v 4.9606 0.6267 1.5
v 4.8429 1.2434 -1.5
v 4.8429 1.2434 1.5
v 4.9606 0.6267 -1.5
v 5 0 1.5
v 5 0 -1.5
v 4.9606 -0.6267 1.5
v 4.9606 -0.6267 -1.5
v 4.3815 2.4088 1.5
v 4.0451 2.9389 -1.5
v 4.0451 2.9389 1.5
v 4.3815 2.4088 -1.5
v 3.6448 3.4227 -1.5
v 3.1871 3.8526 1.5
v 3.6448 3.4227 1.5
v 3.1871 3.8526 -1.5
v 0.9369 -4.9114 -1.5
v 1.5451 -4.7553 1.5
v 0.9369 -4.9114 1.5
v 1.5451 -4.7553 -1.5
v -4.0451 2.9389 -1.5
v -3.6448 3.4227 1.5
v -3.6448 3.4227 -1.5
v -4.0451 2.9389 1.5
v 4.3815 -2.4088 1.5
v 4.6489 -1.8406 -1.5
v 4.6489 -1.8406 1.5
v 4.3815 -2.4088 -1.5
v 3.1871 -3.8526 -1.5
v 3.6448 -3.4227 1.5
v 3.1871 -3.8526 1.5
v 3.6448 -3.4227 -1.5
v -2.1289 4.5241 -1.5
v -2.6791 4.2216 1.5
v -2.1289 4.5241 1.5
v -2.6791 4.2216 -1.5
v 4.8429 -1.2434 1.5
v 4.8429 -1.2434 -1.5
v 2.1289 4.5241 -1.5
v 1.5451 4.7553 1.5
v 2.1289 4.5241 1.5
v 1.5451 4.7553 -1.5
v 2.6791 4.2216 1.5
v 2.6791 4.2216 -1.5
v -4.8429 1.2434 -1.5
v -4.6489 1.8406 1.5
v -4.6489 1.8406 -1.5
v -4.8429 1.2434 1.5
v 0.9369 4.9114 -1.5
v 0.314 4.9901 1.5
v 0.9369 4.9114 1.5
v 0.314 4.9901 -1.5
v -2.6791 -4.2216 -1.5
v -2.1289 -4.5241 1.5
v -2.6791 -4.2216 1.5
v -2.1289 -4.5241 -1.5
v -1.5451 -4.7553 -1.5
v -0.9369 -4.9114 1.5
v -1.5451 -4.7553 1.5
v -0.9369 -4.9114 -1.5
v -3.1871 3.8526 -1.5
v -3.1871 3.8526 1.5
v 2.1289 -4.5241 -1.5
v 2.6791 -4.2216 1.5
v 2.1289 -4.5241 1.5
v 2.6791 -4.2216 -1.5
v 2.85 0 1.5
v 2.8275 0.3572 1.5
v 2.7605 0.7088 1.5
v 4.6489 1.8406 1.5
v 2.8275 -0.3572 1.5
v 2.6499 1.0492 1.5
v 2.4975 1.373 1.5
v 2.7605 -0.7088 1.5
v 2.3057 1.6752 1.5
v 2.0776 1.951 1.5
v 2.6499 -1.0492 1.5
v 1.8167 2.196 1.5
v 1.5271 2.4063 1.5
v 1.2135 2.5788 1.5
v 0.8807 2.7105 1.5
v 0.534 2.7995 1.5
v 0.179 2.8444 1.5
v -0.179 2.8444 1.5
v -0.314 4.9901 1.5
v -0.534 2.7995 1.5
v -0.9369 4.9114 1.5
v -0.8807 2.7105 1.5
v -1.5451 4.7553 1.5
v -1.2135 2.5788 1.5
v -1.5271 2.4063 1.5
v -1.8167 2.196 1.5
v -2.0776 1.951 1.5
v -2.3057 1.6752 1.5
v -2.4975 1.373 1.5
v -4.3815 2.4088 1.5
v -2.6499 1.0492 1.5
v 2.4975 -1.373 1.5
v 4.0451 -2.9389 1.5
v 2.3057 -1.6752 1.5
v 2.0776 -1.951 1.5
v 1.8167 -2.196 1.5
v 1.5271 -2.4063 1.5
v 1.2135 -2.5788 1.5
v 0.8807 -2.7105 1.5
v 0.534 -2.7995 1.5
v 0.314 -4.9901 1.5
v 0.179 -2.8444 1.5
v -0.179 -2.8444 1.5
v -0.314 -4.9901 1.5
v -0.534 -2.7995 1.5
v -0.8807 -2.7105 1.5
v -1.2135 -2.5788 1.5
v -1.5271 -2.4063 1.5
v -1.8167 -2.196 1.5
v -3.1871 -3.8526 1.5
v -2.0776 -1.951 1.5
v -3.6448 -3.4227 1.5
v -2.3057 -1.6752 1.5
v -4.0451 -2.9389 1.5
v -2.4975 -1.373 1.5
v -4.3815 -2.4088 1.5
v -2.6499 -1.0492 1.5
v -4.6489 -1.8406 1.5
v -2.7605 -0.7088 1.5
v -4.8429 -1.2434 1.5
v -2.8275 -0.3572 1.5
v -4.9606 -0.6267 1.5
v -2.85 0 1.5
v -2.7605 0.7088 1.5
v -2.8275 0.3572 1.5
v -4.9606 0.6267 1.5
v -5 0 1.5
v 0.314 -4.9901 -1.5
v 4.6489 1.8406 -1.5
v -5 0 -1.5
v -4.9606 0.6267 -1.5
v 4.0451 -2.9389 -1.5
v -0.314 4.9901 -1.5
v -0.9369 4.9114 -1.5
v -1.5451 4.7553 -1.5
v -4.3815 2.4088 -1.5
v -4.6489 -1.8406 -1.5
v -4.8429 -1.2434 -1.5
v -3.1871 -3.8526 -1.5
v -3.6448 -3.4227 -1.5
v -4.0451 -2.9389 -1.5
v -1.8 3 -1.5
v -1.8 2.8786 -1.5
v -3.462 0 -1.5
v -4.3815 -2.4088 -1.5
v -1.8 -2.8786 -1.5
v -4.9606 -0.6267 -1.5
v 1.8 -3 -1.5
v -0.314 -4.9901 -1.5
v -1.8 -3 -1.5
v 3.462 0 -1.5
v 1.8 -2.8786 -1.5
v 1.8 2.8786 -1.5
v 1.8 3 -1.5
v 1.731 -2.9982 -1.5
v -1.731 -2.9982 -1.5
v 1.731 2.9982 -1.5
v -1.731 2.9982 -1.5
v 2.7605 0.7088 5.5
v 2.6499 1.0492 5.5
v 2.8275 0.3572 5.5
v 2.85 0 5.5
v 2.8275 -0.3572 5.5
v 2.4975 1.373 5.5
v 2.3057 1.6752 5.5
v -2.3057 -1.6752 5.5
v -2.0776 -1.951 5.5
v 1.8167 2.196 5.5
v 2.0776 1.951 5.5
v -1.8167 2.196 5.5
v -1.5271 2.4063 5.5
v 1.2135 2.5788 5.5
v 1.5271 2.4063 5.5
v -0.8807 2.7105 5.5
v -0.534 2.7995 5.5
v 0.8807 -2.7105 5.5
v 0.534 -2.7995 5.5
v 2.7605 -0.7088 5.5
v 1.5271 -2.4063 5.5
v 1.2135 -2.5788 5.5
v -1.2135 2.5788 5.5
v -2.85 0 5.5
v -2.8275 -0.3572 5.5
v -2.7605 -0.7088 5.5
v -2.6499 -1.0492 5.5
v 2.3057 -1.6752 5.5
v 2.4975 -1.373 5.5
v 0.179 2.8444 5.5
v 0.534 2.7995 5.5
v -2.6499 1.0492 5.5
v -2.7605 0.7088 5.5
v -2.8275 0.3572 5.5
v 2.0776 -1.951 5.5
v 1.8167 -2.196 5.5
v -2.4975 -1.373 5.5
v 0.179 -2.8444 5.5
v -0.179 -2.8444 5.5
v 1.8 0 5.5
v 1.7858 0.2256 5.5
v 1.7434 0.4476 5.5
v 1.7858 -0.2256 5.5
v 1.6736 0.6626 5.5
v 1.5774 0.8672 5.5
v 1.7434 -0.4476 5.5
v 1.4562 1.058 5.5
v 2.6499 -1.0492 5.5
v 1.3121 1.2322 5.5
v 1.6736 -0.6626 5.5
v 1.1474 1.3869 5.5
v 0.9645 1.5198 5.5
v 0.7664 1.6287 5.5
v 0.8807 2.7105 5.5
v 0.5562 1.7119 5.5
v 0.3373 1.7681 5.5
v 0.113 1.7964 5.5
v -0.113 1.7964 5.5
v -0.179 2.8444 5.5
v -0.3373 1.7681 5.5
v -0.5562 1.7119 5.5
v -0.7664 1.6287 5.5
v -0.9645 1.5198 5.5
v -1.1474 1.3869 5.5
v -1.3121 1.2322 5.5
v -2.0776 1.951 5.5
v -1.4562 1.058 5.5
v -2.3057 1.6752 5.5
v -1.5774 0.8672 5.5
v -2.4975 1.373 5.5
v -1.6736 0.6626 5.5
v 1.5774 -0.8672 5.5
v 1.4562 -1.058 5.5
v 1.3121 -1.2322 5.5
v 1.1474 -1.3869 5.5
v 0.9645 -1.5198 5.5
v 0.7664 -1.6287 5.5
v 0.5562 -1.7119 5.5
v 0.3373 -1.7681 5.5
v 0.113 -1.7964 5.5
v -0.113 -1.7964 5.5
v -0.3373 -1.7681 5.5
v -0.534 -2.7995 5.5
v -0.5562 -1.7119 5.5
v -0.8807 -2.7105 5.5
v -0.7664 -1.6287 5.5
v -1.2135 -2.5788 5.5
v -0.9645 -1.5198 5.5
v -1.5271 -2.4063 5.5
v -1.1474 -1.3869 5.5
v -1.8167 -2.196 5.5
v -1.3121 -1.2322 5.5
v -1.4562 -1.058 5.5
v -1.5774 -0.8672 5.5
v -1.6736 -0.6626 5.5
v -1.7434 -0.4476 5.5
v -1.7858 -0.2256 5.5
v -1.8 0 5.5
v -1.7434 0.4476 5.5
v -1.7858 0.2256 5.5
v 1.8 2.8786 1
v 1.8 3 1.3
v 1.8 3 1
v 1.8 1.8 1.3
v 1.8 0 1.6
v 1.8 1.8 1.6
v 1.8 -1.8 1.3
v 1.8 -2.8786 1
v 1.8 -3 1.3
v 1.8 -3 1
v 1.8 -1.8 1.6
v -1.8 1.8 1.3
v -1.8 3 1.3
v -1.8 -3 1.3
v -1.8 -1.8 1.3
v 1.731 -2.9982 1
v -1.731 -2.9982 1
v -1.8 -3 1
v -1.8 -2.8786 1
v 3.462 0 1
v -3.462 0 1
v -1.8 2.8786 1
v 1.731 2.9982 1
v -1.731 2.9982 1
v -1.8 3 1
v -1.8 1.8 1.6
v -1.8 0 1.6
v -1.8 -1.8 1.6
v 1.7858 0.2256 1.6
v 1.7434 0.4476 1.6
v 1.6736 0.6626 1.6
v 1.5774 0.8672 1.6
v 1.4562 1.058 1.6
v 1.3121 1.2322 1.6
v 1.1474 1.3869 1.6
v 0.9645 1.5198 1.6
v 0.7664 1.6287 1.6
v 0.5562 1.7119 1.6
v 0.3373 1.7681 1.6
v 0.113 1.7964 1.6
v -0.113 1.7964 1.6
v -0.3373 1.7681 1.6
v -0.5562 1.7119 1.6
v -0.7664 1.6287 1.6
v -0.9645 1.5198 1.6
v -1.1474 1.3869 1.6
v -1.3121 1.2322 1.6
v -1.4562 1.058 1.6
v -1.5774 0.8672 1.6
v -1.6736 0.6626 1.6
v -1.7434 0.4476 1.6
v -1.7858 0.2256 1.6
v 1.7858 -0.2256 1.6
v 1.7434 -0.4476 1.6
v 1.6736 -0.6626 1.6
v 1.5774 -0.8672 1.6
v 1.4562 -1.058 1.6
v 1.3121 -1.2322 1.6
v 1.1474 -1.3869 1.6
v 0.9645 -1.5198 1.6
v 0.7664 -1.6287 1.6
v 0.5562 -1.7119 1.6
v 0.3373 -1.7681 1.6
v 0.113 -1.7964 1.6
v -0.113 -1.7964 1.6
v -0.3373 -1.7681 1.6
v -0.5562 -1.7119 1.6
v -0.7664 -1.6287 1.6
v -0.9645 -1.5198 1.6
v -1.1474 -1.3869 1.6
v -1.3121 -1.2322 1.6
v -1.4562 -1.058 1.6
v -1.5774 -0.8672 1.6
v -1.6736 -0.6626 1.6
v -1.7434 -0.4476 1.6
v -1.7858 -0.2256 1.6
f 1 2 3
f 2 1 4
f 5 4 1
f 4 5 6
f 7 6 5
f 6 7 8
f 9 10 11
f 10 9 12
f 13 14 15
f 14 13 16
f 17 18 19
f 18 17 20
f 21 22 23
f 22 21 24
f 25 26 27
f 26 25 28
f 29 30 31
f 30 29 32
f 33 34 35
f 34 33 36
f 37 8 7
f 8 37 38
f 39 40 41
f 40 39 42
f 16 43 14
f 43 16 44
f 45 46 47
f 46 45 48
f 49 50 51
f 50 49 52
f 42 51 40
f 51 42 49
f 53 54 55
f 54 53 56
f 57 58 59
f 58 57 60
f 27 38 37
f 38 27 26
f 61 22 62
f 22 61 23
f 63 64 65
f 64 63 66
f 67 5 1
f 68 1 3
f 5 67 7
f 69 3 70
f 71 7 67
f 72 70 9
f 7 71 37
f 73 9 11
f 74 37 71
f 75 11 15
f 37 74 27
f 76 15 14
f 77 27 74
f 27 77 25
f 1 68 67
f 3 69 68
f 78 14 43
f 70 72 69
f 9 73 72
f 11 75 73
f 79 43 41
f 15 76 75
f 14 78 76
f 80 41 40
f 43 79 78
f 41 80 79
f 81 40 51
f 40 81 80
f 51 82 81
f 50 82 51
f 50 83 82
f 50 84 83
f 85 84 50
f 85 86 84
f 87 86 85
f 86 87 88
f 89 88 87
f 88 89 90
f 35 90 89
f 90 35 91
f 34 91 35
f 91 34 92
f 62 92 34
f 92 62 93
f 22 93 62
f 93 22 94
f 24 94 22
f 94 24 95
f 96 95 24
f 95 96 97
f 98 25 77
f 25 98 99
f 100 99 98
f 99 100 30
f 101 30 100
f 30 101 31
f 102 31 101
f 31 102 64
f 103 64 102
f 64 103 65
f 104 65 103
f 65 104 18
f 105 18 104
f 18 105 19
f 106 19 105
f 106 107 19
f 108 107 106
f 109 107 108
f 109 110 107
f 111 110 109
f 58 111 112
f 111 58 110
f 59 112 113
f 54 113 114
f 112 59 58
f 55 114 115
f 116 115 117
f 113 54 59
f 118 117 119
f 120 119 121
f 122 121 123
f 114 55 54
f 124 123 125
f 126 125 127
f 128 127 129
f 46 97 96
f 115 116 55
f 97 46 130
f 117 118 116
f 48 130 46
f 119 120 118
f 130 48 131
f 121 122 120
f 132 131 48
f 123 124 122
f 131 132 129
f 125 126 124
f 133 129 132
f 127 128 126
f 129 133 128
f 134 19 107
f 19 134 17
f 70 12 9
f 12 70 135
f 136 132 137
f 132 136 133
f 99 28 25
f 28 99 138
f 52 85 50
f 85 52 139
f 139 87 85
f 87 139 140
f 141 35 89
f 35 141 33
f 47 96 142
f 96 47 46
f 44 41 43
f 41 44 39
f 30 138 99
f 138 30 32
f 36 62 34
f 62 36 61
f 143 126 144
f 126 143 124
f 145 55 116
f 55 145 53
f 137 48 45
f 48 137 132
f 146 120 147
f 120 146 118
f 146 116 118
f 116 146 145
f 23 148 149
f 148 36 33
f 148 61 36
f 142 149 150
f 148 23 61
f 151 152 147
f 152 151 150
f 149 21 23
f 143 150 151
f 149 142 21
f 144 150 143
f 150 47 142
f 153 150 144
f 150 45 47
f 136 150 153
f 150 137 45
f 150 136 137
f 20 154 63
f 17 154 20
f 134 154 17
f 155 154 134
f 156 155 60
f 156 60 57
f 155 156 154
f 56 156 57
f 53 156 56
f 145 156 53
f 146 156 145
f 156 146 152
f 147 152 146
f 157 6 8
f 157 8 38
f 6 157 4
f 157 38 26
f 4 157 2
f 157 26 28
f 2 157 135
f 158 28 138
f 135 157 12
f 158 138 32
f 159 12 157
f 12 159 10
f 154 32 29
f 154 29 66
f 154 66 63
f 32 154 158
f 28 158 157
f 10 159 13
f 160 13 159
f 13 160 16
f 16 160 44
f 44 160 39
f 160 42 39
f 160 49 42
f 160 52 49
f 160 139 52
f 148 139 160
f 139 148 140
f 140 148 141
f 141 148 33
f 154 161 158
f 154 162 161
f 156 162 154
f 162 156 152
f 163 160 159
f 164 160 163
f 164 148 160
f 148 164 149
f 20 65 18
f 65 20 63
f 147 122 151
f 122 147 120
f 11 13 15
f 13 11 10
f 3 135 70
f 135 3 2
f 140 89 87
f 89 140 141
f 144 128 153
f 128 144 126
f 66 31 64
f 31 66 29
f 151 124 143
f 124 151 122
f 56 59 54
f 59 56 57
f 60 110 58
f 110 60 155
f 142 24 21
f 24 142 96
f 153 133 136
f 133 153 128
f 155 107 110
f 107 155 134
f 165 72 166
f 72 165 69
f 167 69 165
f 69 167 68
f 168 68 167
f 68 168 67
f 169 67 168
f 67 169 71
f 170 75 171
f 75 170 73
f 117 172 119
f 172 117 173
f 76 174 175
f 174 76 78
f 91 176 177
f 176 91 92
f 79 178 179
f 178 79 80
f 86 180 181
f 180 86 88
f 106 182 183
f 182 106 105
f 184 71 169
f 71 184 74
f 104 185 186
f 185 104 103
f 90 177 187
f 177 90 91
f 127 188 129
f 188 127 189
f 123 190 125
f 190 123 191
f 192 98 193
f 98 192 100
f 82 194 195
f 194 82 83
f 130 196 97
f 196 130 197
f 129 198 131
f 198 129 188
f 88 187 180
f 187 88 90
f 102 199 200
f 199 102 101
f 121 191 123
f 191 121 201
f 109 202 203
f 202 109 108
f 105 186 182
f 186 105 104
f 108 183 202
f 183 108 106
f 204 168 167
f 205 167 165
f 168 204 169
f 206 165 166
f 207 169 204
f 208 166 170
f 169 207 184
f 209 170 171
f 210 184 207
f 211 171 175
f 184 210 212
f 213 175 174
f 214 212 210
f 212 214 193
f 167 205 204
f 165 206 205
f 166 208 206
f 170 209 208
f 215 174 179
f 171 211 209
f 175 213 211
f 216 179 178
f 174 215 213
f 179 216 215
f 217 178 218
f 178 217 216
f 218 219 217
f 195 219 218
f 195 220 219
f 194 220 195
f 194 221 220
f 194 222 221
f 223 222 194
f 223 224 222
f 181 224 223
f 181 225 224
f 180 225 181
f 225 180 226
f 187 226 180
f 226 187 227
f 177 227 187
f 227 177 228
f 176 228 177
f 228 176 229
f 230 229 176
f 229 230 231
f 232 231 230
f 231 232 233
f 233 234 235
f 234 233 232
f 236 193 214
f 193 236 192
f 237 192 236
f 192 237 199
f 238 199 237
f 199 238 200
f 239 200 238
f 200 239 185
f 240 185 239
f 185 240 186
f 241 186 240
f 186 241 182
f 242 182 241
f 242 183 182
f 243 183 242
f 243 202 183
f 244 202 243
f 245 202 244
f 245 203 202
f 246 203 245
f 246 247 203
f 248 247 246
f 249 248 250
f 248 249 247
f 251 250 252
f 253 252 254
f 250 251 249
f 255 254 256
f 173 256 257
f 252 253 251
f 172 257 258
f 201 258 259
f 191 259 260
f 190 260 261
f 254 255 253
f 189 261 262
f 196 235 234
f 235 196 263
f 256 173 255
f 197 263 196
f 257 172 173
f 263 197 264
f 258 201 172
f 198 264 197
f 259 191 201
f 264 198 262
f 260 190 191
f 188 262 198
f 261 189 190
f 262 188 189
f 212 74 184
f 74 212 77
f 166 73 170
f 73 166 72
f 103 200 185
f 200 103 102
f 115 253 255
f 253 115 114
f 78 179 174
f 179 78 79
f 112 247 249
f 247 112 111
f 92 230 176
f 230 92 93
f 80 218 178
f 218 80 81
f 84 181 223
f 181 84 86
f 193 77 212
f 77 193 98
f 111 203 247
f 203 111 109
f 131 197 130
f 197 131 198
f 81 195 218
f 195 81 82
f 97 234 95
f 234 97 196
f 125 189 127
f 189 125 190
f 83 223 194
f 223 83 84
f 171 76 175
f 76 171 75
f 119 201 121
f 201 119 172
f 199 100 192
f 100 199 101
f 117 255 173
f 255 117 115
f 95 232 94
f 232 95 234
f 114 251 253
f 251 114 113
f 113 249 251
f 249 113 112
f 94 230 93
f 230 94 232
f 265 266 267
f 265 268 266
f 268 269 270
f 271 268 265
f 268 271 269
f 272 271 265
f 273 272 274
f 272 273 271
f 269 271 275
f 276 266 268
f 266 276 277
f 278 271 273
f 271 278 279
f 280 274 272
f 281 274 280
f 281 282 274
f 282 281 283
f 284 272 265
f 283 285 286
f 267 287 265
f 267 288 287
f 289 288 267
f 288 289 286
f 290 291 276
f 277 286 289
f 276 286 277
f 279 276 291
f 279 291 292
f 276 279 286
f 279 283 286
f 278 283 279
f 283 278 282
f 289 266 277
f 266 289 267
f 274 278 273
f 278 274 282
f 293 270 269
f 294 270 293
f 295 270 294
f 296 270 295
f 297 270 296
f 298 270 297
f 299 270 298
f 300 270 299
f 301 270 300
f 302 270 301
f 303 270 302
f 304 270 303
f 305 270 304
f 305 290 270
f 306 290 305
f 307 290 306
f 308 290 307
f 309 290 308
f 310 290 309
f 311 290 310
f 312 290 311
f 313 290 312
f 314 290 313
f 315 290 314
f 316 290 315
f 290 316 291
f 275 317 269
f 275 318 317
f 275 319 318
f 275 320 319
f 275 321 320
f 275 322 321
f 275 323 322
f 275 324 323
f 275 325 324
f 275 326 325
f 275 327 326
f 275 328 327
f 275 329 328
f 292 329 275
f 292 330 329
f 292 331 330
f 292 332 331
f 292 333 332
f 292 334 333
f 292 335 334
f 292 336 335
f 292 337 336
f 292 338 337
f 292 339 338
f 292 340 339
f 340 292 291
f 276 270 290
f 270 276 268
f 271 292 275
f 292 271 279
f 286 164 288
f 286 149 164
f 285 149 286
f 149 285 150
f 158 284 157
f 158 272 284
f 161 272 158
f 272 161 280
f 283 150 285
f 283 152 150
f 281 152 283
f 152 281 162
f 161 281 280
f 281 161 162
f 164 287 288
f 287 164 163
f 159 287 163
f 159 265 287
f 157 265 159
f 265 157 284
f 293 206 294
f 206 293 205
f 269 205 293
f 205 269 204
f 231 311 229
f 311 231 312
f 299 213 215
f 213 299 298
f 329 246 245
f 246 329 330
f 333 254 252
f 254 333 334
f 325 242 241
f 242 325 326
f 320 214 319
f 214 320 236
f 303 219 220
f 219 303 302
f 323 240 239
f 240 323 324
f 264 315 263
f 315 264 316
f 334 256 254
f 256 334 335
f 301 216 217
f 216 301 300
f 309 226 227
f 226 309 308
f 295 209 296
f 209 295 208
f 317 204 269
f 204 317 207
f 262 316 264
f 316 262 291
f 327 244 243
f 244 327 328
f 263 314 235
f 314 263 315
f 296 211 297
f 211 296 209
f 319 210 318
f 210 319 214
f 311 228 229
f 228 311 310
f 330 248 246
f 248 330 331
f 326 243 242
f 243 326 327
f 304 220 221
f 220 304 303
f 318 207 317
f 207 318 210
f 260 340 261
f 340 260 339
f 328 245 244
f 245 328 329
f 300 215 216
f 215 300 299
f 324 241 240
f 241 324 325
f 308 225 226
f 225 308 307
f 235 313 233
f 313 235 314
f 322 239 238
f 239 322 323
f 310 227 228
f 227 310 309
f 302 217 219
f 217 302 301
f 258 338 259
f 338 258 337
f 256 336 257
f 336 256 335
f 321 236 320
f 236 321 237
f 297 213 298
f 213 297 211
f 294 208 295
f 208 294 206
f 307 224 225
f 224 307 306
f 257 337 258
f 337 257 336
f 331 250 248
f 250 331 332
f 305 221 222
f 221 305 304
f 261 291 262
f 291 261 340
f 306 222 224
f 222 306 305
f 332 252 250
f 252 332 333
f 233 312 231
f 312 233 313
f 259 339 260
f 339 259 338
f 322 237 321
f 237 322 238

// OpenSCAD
$fn = 50;


difference() {
	union() {
		translate(v = [0, 0, -1.5000000000]) {
			cylinder(h = 3, r = 5.0000000000);
		}
		translate(v = [0, 0, -1.5000000000]) {
			cylinder(h = 7, r = 2.8500000000);
		}
	}
	union() {
		translate(v = [0, 0, -1.5000000000]) {
			rotate(a = [0, 0, 0]) {
				difference() {
					union() {
						translate(v = [-1.8000000000, -3.0000000000, -0.3000000000]) {
							cube(size = [3.6000000000, 6.0000000000, 0.3000000000]);
						}
						translate(v = [-1.8000000000, -1.8000000000, -0.6000000000]) {
							cube(size = [3.6000000000, 3.6000000000, 0.3000000000]);
						}
						translate(v = [-1.8000000000, -3.0000000000, 2.5000000000]) {
							cube(size = [3.6000000000, 6.0000000000, 0.3000000000]);
						}
						translate(v = [-1.8000000000, -1.8000000000, 2.8000000000]) {
							cube(size = [3.6000000000, 3.6000000000, 0.3000000000]);
						}
						linear_extrude(height = 2.5000000000) {
							polygon(points = [[3.4620000000, 0.0000000000], [1.7310000000, 2.9981799479], [-1.7310000000, 2.9981799479], [-3.4620000000, 0.0000000000], [-1.7310000000, -2.9981799479], [1.7310000000, -2.9981799479]]);
						}
						translate(v = [-1.8000000000, -3.0000000000, -0.3000000000]) {
							cube(size = [3.6000000000, 6.0000000000, 0.3000000000]);
						}
						translate(v = [-1.8000000000, -1.8000000000, -0.6000000000]) {
							cube(size = [3.6000000000, 3.6000000000, 0.3000000000]);
						}
						translate(v = [-1.8000000000, -3.0000000000, 2.5000000000]) {
							cube(size = [3.6000000000, 6.0000000000, 0.3000000000]);
						}
						translate(v = [-1.8000000000, -1.8000000000, 2.8000000000]) {
							cube(size = [3.6000000000, 3.6000000000, 0.3000000000]);
						}
						translate(v = [-1.8000000000, -3.0000000000, -0.3000000000]) {
							cube(size = [3.6000000000, 6.0000000000, 0.3000000000]);
						}
						translate(v = [-1.8000000000, -1.8000000000, -0.6000000000]) {
							cube(size = [3.6000000000, 3.6000000000, 0.3000000000]);
						}
						translate(v = [-1.8000000000, -3.0000000000, 2.5000000000]) {
							cube(size = [3.6000000000, 6.0000000000, 0.3000000000]);
						}
						translate(v = [-1.8000000000, -1.8000000000, 2.8000000000]) {
							cube(size = [3.6000000000, 3.6000000000, 0.3000000000]);
						}
					}
					union();
				}
			}
		}
		translate(v = [0, 0, -50.0000000000]) {
			cylinder(h = 100, r = 1.8000000000);
		}
	}
}
